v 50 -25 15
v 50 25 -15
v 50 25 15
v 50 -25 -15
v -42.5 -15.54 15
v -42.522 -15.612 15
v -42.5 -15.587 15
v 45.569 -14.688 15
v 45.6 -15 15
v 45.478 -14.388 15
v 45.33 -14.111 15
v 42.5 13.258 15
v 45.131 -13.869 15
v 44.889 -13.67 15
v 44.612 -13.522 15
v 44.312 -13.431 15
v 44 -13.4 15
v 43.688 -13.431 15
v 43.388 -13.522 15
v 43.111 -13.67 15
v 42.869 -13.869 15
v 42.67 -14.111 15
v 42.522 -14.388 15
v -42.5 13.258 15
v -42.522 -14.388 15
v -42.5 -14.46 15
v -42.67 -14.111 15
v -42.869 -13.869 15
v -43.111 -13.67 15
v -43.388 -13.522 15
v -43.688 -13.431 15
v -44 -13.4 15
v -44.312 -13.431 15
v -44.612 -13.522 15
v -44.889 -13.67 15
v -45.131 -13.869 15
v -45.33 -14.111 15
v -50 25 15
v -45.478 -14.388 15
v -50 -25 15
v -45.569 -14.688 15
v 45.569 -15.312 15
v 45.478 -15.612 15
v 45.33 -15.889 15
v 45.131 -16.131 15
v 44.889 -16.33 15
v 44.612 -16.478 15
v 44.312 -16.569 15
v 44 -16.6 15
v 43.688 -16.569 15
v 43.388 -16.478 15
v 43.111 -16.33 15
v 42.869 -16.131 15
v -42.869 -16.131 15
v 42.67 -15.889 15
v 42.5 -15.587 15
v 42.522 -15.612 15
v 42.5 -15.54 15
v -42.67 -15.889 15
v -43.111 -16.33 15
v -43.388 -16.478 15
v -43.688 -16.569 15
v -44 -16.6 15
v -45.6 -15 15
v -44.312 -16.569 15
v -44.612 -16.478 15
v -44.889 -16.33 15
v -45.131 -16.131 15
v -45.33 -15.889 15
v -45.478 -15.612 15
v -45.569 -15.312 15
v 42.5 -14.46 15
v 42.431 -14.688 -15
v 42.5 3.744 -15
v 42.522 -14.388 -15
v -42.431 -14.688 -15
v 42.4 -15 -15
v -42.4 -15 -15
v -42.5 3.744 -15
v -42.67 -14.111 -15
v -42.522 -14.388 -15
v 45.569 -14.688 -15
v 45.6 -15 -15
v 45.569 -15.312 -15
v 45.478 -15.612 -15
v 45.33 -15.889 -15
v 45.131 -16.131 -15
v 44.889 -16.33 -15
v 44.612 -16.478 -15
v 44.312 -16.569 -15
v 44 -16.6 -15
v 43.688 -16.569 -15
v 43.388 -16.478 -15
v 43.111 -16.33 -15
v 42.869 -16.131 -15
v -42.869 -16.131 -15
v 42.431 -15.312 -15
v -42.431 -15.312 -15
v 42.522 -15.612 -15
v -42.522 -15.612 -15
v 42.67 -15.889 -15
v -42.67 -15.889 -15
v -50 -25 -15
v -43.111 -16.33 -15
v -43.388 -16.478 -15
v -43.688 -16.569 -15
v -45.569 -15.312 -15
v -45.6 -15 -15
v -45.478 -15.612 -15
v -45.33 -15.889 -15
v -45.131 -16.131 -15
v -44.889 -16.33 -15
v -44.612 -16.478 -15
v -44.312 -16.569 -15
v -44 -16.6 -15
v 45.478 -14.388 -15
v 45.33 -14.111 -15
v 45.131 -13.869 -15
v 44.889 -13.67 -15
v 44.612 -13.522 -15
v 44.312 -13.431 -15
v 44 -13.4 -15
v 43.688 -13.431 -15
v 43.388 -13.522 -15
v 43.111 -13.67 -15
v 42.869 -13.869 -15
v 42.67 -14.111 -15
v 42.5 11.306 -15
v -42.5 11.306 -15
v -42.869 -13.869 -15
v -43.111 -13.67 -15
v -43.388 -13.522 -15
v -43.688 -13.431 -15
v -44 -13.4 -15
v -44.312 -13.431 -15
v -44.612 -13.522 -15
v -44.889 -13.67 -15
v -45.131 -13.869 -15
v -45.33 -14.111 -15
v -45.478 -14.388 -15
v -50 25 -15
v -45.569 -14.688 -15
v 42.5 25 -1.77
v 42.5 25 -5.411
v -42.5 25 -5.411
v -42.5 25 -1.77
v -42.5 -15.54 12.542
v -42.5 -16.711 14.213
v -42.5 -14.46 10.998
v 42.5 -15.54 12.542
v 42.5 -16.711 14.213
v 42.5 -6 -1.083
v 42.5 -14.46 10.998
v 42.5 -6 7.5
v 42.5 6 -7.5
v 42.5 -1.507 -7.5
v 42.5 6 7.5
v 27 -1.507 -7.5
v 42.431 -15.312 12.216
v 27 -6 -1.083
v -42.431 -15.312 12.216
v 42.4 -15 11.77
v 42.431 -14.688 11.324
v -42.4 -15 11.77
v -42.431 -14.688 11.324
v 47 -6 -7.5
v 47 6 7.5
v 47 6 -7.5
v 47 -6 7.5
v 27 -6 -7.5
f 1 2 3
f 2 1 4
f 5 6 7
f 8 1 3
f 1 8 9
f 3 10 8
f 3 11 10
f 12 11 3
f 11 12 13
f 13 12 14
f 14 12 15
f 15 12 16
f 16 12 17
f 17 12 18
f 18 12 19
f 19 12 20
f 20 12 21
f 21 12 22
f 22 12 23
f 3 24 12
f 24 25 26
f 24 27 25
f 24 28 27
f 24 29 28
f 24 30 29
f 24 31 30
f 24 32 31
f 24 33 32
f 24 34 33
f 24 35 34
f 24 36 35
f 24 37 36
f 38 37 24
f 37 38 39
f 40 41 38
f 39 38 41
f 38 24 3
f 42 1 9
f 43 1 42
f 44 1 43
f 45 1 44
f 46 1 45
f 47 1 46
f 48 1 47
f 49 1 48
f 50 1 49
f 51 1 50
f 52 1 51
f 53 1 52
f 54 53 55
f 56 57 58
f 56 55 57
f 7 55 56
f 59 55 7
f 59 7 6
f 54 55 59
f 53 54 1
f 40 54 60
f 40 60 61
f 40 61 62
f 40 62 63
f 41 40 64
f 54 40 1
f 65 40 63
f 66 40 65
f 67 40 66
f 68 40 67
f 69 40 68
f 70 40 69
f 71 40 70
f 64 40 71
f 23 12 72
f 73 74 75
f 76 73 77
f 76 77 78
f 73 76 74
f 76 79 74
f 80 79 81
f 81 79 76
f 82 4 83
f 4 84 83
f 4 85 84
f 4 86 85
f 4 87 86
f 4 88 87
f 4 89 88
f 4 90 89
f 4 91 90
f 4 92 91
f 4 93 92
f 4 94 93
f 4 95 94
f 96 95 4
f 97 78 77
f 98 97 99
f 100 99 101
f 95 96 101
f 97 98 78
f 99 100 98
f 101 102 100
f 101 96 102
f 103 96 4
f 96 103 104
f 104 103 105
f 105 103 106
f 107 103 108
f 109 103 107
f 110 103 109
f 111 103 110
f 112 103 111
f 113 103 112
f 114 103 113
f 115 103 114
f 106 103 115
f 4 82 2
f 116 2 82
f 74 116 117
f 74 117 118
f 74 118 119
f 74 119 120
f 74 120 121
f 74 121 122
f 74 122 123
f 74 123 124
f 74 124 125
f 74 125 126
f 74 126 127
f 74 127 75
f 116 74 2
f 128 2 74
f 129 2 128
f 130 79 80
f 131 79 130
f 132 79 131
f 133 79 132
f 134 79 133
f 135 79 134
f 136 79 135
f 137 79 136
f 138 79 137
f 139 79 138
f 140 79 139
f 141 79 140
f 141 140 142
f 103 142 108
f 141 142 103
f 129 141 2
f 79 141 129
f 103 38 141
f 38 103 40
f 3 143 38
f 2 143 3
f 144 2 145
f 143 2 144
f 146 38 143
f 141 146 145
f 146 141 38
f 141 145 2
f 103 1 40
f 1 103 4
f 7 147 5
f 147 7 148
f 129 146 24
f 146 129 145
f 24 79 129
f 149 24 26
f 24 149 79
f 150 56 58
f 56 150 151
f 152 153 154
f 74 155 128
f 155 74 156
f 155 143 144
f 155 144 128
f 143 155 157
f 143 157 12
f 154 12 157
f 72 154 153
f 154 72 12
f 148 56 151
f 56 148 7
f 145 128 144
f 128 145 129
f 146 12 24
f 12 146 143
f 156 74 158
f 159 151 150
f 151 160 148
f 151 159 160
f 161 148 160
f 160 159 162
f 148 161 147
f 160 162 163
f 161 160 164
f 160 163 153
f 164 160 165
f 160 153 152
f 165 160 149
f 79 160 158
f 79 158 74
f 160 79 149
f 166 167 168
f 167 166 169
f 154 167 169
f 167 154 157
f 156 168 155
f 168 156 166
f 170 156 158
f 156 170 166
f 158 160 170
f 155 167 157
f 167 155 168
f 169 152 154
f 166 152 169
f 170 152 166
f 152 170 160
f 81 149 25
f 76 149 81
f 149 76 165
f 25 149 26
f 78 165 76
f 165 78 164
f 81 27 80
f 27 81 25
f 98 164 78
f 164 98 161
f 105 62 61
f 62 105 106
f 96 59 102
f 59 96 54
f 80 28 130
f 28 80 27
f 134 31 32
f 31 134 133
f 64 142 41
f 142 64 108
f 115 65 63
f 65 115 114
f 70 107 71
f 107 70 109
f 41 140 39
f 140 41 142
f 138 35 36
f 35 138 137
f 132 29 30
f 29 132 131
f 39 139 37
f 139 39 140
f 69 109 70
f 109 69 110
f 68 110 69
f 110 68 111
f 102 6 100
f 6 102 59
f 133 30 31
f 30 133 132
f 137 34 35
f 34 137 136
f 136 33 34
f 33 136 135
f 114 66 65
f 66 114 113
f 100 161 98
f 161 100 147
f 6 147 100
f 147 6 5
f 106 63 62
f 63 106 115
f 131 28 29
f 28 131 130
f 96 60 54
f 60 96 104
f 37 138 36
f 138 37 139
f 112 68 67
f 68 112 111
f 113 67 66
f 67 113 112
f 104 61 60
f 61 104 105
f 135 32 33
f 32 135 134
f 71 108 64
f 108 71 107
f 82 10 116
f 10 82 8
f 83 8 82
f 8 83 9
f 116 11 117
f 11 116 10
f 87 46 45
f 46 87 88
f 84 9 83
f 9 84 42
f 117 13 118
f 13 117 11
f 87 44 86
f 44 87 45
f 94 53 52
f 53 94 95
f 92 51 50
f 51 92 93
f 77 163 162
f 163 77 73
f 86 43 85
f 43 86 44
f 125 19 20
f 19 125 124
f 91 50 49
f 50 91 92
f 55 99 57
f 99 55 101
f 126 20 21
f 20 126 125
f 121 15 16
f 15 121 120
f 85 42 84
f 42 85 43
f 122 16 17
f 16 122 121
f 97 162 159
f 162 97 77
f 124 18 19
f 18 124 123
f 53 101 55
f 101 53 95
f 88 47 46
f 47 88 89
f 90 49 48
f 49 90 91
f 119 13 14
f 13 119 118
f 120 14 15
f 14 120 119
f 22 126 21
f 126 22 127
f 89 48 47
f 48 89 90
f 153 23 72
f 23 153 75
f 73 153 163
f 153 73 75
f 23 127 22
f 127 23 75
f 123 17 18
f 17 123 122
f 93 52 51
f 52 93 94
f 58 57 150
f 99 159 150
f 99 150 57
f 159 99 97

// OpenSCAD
// =============================================================================
// KHORA // Leap Motion Controller 2 / Stereo IR Sensor Forward Bracket
// License: MIT
// Author: iriss-dev <contact@iriss.dev>
// =============================================================================

$fn = 32;

sensor_width = 84.0;
sensor_depth = 24.0;
sensor_height = 12.0;

bracket_angle = 35.0; // Angled forward facing floating optical plane

module sensor_bracket() {
    difference() {
        // Base wedge
        cube([sensor_width + 16, 50, 30], center = true);

        // Angled recess for sensor
        translate([0, 5, 5])
            rotate([bracket_angle, 0, 0])
            cube([sensor_width + 1.0, sensor_depth + 1.0, 40], center = true);

        // USB-C cable exit port
        translate([sensor_width/2 - 5, 0, 0])
            cube([20, 12, 15], center = true);

        // M3 mount slots
        translate([-sensor_width/2 - 2, -15, 0])
            cylinder(h = 60, d = 3.2, center = true);
        translate([sensor_width/2 + 2, -15, 0])
            cylinder(h = 60, d = 3.2, center = true);
    }
}

sensor_bracket();
